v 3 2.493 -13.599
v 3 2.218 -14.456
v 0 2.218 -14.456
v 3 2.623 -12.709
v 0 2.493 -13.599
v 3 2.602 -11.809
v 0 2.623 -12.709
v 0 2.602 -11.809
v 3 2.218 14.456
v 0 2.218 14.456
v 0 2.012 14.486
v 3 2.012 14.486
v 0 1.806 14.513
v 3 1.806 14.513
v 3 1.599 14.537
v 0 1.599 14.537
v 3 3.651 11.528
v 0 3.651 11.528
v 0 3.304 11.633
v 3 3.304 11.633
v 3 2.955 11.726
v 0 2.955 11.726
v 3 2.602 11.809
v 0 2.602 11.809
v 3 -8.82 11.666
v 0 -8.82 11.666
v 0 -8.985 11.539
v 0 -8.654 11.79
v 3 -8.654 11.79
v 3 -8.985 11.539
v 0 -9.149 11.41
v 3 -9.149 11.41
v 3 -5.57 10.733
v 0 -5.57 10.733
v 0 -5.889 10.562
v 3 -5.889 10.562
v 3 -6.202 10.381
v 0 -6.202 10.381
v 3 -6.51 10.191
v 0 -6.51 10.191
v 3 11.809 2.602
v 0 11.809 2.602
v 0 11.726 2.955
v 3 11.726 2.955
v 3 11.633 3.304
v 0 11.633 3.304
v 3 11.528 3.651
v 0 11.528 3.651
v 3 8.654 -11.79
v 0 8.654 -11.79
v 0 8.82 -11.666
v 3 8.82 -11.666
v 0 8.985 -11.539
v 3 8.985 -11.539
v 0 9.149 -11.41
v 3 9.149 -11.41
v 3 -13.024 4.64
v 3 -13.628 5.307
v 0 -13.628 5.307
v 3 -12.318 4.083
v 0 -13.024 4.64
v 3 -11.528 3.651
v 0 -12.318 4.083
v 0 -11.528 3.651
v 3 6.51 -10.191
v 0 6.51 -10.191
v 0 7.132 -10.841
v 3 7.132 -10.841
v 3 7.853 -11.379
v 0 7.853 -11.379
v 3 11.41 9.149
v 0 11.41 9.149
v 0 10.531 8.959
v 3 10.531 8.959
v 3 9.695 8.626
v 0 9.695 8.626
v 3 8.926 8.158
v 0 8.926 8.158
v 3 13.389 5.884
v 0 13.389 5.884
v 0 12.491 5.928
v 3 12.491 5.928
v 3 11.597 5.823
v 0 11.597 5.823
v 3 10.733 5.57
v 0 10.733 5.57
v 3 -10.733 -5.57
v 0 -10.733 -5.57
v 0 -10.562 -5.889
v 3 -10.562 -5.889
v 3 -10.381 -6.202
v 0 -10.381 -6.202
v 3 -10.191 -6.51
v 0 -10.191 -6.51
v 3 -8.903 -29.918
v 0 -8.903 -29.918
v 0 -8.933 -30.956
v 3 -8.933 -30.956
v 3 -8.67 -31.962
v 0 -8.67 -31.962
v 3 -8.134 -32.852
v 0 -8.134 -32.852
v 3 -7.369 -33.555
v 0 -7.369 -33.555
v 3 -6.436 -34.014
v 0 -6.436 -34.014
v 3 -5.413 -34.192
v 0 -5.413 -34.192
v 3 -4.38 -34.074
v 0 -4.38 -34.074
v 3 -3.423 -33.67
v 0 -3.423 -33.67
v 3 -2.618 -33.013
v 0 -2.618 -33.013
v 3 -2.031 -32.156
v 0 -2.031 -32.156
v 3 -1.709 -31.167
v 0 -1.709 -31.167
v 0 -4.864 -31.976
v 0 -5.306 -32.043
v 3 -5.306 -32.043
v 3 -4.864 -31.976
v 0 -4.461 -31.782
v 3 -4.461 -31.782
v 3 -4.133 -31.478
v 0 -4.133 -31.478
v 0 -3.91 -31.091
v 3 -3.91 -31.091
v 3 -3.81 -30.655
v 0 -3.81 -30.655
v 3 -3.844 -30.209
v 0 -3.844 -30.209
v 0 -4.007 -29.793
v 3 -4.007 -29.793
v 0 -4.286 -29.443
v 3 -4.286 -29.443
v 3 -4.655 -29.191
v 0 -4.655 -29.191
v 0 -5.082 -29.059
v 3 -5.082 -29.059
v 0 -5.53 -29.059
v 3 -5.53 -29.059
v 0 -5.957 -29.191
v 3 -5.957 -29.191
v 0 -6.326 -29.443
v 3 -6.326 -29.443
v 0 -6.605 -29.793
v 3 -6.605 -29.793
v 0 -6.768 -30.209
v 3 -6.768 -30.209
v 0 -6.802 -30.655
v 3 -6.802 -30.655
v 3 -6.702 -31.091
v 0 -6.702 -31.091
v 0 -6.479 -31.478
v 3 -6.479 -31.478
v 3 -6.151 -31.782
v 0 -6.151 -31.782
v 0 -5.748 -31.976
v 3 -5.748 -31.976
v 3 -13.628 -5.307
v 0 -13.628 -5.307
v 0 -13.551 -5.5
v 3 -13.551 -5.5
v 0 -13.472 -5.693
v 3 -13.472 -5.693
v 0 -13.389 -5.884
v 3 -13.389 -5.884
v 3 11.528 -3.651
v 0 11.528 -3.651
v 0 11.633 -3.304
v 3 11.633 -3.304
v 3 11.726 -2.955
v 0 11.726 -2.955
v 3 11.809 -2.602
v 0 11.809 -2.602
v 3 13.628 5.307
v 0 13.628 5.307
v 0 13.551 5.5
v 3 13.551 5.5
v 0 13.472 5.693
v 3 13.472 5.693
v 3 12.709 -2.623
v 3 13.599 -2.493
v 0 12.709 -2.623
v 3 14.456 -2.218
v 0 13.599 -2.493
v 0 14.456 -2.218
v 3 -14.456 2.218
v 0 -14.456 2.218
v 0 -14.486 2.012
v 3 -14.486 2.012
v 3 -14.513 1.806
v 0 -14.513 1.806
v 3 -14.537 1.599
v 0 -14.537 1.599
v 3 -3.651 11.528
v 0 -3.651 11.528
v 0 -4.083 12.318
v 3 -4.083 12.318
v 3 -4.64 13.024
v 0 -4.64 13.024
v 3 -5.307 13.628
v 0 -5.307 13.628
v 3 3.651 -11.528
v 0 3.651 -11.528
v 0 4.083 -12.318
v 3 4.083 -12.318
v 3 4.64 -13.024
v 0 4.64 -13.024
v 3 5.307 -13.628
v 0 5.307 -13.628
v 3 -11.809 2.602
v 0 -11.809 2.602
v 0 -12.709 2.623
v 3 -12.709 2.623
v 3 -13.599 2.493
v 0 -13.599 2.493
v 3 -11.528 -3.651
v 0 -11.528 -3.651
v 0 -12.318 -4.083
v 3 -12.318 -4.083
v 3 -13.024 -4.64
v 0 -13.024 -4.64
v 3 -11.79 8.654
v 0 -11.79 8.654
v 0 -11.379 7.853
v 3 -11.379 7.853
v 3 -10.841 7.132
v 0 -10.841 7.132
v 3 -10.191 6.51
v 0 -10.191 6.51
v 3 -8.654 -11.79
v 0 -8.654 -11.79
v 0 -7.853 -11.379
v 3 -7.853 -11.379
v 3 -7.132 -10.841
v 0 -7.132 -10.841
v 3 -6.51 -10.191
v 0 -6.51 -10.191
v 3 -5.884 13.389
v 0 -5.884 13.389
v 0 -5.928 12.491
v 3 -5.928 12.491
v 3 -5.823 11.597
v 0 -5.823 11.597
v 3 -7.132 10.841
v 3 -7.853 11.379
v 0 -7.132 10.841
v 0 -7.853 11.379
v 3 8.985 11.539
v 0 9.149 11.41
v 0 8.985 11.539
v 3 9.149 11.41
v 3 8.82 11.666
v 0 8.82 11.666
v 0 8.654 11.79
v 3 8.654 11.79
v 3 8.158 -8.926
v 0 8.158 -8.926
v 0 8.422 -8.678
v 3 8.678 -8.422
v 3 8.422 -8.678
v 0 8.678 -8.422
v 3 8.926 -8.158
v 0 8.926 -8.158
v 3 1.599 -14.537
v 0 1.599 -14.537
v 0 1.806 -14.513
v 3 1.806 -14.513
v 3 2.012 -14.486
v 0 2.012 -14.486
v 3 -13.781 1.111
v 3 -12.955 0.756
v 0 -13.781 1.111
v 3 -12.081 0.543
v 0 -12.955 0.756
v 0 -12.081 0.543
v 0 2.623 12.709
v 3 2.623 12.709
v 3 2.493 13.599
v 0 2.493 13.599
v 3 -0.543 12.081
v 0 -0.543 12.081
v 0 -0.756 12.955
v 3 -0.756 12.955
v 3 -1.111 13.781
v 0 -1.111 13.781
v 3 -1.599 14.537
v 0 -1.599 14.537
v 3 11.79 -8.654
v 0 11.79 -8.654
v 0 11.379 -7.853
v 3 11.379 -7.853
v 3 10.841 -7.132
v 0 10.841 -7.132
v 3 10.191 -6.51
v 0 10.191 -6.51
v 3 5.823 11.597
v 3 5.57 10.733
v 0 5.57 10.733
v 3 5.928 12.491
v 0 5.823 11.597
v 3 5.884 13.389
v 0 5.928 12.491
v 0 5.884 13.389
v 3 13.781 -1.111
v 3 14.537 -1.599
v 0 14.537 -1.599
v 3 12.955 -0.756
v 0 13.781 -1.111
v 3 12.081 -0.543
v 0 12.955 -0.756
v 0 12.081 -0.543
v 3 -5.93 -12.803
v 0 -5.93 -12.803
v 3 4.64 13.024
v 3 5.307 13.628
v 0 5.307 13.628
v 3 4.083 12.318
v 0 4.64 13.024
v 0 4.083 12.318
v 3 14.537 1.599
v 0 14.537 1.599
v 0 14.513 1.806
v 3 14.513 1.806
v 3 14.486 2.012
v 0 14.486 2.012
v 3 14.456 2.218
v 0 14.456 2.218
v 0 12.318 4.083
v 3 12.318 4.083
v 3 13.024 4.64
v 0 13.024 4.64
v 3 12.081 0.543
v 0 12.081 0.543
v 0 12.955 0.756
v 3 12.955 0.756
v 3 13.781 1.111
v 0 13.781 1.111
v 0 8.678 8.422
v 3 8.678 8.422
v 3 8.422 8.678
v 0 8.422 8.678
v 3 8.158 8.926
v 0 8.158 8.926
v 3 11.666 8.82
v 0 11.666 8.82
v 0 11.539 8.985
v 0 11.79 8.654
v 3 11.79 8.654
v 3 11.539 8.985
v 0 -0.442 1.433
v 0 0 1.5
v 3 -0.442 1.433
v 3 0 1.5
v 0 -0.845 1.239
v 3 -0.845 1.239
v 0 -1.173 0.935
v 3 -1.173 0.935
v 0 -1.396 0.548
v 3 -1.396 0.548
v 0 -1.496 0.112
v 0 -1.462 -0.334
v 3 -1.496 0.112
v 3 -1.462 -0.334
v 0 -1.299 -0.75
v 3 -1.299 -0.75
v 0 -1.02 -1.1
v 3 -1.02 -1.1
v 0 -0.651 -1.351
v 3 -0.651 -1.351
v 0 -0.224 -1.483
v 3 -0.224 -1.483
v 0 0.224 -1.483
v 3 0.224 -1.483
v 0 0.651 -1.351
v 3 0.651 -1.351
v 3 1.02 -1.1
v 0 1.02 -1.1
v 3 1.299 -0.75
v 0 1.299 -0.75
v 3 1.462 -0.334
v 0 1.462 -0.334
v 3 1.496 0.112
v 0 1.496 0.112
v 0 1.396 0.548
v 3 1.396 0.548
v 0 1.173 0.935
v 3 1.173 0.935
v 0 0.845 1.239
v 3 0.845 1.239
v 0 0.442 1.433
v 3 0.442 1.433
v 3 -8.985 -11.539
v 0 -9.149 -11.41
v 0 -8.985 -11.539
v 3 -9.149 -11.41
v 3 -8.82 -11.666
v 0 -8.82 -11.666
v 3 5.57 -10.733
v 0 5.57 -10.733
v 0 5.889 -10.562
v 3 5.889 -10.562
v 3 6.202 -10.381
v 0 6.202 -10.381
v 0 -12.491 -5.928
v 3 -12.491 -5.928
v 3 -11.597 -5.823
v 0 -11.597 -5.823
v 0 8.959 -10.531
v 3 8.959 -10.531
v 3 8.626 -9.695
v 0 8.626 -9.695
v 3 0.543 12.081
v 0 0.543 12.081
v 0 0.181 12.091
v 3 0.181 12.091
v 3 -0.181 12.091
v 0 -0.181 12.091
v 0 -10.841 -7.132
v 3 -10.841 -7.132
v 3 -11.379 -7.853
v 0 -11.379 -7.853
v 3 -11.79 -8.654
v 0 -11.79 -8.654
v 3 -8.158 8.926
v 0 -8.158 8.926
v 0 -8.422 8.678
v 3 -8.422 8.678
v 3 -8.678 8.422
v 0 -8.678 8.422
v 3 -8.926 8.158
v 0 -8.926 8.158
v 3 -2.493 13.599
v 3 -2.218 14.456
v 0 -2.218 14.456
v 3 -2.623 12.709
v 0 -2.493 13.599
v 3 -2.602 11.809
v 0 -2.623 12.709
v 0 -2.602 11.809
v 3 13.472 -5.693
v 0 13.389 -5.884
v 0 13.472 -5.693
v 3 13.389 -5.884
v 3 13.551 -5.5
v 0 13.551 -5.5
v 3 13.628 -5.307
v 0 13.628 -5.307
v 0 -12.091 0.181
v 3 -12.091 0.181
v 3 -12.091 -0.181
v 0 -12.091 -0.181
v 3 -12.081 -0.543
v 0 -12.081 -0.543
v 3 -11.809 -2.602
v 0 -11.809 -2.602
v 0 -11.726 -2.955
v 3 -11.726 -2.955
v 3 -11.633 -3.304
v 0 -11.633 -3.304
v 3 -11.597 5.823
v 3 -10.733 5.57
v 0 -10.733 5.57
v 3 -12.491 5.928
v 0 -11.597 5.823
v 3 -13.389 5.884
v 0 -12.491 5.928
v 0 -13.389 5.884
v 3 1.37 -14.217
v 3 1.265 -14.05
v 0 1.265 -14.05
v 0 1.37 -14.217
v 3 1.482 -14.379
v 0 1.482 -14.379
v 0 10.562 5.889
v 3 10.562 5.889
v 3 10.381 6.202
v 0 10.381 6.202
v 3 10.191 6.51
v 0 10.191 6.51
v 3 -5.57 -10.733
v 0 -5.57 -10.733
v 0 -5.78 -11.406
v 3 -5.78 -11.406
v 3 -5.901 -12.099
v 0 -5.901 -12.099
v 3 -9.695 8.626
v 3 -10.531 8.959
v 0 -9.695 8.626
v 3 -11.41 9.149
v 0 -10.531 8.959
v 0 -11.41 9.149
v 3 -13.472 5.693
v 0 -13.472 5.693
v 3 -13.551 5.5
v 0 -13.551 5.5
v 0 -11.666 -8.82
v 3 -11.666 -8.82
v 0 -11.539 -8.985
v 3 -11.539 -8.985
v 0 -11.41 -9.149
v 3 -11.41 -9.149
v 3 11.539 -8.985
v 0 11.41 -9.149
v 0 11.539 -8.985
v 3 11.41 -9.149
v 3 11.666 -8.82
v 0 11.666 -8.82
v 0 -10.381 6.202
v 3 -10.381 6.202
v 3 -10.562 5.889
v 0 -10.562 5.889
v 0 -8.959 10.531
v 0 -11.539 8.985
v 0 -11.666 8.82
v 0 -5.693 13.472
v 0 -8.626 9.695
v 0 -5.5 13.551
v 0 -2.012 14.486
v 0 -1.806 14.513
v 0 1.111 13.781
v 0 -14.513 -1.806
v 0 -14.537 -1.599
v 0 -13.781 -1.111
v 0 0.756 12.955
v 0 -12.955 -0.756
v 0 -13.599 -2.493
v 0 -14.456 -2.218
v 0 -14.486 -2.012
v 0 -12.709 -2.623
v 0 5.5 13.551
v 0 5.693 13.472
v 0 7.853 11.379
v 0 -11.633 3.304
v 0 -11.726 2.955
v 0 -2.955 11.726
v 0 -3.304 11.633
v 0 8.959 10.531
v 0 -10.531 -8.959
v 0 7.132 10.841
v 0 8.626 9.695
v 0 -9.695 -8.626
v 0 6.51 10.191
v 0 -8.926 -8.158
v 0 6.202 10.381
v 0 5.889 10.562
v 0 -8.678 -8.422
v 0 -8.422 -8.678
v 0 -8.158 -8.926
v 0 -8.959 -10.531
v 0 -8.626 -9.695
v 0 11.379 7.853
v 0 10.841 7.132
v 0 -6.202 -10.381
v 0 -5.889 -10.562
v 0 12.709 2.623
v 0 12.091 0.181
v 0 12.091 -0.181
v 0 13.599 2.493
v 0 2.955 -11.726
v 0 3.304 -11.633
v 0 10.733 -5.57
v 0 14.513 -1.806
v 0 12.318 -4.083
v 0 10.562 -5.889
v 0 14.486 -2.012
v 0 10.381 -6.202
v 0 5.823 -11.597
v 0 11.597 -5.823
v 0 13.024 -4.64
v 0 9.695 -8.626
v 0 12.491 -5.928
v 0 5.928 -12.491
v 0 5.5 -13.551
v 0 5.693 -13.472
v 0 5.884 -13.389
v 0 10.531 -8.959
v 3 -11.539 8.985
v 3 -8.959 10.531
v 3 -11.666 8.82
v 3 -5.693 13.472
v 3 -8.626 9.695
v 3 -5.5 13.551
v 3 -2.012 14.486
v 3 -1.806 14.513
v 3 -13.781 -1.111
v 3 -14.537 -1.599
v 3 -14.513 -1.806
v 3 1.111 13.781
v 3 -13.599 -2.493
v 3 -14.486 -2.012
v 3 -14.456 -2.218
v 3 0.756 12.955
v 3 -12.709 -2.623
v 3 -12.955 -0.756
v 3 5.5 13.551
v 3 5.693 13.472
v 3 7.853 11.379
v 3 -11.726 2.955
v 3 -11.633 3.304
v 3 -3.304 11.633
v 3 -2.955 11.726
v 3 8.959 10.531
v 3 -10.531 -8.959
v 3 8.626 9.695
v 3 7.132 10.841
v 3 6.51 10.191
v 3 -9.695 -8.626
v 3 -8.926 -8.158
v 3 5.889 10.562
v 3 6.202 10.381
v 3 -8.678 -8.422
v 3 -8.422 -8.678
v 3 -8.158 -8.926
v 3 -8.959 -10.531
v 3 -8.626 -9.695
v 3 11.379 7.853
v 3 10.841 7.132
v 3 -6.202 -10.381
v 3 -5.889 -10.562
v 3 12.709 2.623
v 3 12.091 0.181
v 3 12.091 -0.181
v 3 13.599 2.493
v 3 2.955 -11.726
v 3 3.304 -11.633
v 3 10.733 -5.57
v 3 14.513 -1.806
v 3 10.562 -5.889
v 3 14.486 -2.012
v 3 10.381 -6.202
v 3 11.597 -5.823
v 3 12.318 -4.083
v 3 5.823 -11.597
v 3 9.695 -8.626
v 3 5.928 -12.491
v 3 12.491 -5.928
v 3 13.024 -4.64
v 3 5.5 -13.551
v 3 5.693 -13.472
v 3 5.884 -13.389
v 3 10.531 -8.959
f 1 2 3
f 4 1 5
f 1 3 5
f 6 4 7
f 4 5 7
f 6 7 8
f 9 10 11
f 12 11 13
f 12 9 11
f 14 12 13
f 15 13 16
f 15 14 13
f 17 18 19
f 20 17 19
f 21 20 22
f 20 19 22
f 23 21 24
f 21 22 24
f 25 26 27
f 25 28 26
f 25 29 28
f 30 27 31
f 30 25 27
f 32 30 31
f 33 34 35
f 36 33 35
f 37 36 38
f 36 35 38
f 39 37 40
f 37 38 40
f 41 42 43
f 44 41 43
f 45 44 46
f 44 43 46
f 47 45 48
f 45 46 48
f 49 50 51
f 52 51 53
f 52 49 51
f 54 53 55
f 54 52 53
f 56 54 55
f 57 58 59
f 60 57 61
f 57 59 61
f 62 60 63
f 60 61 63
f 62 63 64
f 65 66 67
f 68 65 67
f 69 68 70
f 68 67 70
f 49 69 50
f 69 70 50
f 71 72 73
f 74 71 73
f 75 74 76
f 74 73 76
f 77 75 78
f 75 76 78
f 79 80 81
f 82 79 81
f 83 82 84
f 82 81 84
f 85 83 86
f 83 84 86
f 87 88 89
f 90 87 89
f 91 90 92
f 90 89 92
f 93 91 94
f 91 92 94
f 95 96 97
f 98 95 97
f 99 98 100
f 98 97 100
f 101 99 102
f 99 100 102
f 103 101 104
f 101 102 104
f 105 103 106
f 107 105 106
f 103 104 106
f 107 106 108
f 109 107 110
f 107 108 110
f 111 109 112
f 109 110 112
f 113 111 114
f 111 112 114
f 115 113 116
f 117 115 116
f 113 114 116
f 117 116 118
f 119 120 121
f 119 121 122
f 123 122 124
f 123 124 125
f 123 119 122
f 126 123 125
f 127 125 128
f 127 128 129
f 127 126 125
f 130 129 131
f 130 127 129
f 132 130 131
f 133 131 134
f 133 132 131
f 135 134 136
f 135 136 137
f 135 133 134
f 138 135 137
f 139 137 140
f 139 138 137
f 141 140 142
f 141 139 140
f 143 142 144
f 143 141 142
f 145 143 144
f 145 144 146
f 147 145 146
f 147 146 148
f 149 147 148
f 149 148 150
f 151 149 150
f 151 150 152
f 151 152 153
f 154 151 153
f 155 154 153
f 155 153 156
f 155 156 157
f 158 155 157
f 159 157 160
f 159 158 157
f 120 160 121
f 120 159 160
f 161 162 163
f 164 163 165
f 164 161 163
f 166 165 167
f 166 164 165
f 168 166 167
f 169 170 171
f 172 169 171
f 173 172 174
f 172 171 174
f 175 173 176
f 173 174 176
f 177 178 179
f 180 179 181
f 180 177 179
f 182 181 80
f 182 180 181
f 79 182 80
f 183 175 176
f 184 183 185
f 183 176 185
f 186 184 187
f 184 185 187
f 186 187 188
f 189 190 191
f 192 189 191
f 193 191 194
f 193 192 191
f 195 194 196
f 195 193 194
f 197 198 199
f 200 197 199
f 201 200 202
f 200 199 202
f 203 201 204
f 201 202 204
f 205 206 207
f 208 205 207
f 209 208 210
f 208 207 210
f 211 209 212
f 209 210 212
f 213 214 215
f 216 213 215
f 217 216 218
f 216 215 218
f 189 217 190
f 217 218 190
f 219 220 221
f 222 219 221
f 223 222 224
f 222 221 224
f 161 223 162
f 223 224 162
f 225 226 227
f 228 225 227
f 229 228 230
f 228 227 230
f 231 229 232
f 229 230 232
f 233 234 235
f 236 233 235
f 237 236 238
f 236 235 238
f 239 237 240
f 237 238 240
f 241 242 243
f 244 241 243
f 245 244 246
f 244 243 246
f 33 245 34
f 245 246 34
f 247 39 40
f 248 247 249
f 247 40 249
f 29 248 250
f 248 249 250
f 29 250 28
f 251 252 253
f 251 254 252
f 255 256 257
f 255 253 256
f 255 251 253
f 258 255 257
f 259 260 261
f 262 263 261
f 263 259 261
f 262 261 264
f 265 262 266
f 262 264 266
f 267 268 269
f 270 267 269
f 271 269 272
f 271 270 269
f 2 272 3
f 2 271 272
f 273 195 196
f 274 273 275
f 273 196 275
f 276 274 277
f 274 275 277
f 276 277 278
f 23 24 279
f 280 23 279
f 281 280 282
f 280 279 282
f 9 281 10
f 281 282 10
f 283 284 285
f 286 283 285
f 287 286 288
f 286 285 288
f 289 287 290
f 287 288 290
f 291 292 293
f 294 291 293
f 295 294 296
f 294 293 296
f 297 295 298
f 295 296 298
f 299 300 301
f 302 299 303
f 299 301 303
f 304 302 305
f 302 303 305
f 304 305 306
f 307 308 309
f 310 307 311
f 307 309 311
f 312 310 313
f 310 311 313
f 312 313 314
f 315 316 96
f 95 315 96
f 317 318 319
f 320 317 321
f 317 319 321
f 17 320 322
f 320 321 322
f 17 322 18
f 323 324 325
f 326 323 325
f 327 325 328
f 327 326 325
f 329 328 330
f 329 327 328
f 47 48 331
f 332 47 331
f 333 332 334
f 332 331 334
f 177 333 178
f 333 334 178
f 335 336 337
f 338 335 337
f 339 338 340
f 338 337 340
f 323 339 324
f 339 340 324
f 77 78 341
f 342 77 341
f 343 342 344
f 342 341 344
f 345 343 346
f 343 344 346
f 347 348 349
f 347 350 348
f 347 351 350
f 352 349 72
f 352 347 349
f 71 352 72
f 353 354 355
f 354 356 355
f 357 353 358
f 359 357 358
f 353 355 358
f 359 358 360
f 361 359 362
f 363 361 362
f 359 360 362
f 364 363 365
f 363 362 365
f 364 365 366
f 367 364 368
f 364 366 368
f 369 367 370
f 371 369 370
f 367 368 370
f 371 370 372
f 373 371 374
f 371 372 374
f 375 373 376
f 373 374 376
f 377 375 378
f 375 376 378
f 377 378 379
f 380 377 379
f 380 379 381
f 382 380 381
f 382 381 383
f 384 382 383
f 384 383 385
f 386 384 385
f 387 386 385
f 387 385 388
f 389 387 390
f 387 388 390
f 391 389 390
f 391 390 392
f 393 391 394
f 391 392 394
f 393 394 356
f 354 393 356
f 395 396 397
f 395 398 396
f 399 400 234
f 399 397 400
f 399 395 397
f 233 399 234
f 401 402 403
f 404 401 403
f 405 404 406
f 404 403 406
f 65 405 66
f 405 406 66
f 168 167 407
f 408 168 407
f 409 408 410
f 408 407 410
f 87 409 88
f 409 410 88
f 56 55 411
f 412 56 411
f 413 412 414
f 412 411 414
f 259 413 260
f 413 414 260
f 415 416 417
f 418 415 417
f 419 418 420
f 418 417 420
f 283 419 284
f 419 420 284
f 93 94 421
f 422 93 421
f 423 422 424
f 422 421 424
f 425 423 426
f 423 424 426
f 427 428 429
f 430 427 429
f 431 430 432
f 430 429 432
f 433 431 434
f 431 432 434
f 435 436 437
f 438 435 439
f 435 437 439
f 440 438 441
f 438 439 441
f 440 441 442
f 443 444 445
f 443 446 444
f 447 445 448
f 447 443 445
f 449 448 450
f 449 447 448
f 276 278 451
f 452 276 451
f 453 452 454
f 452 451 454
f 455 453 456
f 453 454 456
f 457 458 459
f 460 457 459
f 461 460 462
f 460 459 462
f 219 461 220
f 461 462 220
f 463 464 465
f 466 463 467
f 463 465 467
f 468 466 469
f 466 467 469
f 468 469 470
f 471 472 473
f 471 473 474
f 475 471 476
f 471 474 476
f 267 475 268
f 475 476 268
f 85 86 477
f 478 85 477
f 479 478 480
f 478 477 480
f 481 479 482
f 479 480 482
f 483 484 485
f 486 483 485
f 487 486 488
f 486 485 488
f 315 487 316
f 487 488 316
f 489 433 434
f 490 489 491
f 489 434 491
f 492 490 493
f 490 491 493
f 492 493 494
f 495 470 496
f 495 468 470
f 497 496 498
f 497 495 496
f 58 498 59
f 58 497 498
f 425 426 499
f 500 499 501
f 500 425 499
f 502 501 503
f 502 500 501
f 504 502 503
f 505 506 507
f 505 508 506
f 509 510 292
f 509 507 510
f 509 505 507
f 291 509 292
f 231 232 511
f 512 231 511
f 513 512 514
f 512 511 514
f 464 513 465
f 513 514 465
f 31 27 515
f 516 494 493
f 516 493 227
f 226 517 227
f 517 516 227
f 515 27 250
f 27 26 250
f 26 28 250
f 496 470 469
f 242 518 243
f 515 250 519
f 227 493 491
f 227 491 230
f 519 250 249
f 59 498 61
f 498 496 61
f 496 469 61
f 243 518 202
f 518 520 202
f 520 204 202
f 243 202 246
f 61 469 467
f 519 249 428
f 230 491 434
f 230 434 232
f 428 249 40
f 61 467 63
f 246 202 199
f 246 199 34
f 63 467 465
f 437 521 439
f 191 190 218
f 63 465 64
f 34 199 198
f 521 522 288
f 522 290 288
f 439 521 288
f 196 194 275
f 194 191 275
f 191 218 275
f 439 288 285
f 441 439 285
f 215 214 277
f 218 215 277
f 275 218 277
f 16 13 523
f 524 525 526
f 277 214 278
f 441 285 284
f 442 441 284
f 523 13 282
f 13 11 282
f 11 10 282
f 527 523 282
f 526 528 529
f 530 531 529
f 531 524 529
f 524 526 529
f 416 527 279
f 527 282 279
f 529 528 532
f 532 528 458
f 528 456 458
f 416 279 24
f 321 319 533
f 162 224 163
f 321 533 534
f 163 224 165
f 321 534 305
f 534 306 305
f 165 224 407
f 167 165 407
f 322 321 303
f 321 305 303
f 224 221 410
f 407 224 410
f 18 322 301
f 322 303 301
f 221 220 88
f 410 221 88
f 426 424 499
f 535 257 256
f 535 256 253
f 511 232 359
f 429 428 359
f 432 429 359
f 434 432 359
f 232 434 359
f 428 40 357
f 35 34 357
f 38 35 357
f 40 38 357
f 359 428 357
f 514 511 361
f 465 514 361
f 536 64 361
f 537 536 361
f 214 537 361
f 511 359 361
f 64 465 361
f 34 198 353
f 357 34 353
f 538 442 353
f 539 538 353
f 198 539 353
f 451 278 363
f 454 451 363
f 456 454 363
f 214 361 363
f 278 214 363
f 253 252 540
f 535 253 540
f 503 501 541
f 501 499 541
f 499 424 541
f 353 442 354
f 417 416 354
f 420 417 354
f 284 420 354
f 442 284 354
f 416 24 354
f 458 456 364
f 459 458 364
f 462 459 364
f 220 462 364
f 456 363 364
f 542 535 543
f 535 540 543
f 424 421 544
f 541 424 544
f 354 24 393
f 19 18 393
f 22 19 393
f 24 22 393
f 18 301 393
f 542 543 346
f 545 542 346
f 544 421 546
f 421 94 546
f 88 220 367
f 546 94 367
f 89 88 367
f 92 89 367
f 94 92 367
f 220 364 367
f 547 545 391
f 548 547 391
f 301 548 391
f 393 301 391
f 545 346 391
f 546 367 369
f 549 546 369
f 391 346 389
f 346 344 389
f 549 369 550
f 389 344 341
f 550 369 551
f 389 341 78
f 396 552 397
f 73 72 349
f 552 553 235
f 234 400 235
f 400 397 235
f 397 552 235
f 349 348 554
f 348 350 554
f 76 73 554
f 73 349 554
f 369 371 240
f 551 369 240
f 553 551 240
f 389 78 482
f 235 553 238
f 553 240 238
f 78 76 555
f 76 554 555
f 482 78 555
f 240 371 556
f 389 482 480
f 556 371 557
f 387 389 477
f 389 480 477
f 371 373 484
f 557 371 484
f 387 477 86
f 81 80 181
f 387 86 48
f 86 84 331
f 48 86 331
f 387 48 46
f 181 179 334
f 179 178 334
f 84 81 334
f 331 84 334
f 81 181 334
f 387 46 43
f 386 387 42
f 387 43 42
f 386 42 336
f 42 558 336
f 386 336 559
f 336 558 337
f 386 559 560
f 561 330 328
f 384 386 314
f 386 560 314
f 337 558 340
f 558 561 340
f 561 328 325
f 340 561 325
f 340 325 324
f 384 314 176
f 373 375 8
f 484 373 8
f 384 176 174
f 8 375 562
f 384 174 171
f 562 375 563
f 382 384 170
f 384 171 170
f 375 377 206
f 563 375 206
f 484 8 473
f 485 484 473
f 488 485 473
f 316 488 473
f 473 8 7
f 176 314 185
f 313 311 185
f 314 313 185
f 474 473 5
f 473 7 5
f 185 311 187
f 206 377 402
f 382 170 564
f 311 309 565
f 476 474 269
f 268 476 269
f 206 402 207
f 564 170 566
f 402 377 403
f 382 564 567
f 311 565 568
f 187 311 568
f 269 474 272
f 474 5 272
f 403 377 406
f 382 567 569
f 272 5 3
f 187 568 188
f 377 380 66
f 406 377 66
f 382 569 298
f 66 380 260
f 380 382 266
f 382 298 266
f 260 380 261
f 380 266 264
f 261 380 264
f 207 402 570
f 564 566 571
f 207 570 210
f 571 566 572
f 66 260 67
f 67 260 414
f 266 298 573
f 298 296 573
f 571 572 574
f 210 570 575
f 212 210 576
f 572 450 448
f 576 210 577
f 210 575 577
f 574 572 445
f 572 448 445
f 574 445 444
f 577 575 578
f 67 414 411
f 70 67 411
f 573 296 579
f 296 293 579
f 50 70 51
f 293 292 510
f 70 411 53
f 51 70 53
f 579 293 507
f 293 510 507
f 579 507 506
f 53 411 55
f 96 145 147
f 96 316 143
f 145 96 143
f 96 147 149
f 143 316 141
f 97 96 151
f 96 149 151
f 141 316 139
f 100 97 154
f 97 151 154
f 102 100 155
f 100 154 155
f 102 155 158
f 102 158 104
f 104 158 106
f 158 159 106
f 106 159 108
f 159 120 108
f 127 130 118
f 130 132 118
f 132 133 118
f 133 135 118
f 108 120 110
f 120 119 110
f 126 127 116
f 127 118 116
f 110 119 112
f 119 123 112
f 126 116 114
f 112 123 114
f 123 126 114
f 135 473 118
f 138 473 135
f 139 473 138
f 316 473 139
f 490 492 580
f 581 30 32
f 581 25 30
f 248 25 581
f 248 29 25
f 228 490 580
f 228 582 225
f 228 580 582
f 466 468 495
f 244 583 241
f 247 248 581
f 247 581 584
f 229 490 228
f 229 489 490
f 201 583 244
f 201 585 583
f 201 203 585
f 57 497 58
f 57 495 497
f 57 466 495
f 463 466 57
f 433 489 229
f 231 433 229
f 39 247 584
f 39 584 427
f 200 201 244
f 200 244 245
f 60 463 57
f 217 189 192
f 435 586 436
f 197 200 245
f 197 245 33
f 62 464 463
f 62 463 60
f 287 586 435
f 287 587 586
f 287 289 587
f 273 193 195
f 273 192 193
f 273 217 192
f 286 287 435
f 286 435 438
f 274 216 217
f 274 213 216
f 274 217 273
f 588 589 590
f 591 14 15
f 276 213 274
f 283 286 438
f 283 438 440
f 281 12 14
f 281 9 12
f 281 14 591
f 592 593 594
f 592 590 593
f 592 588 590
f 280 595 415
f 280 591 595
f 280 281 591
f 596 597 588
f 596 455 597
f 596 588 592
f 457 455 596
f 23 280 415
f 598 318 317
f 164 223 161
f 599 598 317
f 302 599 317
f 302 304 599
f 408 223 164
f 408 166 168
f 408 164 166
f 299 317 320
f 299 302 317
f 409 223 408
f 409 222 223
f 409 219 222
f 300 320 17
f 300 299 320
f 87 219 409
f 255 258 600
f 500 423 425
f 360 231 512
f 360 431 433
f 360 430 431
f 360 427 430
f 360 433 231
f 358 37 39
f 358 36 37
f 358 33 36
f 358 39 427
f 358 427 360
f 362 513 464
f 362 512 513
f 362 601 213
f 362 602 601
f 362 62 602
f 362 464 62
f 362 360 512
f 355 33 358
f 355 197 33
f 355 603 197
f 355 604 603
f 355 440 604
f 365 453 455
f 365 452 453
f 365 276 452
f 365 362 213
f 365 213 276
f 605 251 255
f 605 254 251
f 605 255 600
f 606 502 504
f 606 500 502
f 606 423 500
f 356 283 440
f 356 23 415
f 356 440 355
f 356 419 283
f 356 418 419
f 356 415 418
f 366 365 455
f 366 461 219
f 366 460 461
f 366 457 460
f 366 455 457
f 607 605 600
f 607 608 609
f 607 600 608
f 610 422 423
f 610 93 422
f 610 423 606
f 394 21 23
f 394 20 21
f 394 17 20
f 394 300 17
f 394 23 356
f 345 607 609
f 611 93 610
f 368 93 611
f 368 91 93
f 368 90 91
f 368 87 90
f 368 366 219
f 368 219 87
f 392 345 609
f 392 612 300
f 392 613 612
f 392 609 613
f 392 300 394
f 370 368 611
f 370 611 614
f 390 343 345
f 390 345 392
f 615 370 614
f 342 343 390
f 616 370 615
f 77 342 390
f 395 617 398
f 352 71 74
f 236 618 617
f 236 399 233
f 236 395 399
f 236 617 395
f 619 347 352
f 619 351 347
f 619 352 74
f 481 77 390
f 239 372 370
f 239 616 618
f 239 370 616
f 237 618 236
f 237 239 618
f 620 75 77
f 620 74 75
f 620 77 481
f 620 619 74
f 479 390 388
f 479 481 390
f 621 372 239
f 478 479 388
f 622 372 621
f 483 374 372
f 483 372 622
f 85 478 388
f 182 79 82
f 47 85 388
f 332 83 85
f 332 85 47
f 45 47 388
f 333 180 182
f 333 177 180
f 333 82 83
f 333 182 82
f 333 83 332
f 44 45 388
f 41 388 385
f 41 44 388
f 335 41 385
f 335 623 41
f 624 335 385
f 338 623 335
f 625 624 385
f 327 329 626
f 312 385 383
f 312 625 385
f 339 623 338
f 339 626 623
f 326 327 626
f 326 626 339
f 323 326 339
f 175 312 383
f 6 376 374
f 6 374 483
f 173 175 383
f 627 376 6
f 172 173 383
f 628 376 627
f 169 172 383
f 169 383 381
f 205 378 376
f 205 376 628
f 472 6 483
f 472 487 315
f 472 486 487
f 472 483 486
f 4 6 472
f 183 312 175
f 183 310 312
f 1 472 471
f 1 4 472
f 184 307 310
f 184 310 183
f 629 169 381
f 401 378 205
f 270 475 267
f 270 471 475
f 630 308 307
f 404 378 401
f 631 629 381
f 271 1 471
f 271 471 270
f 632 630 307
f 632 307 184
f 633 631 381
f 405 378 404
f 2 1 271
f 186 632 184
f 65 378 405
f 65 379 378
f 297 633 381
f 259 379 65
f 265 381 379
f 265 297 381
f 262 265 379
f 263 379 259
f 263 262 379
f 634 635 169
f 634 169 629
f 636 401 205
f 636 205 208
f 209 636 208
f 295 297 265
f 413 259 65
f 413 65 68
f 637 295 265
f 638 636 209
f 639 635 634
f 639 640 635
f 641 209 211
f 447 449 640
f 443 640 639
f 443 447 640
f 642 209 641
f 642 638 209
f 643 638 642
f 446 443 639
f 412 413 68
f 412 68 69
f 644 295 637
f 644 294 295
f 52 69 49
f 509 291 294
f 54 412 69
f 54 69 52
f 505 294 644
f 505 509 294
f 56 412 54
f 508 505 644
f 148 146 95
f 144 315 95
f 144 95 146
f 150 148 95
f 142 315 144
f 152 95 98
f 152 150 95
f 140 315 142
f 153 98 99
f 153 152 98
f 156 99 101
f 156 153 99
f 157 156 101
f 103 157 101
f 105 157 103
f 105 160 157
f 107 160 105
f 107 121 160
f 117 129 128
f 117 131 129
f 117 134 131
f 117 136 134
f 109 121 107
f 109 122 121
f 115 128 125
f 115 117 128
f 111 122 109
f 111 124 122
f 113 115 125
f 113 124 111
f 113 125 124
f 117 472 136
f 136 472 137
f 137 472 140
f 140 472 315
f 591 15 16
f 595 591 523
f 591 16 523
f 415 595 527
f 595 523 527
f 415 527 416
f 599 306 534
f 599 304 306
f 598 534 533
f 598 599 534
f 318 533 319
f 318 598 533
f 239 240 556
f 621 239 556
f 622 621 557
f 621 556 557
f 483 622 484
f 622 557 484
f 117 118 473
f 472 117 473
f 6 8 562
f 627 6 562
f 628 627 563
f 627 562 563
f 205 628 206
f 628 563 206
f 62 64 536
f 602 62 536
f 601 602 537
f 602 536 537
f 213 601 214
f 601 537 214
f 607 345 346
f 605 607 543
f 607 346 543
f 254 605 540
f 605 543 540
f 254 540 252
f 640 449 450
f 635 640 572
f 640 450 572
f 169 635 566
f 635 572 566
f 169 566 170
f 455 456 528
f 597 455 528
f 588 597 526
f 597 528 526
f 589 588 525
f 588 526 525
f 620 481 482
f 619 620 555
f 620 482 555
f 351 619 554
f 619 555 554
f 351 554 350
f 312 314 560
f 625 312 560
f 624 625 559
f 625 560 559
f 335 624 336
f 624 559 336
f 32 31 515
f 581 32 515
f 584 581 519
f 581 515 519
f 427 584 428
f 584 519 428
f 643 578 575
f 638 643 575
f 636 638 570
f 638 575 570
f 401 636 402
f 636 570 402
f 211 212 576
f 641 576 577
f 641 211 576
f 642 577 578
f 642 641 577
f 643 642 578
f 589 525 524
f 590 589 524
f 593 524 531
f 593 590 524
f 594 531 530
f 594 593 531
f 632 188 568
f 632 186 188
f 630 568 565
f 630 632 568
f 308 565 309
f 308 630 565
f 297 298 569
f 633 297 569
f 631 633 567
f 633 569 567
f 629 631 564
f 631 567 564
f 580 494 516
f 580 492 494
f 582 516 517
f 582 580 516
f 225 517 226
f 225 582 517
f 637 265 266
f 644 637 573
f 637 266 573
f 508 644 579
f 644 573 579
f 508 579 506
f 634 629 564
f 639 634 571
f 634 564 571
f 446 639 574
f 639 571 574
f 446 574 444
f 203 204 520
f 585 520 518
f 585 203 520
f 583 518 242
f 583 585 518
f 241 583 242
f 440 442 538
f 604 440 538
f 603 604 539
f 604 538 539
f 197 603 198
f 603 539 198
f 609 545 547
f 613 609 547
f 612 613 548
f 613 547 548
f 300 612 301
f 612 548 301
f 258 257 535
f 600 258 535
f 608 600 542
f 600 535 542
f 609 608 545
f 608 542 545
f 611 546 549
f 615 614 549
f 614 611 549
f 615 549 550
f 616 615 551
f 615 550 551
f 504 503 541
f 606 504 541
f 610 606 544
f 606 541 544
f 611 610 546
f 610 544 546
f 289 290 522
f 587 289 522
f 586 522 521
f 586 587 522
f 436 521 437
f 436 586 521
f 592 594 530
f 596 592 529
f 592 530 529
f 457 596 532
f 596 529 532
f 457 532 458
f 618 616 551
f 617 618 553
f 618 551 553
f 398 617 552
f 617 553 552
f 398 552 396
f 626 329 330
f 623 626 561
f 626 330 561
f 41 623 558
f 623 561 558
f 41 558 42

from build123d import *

# Parameters (mm, degrees)
BASPROSKE_W         = 3
BASPROSKE_H         = 14.625
TOOTHCUT_DEPTH      = 21.89931219
TEETHCUTS_COUNT     = 24
TEETHCUTS_ANGLE     = 345
BORSKE_R            = 1.5
BORE_DEPTH          = 50.0000508
SKETCH1_R           = 1.5
BOSS_EXTRUDE1_DEPTH = 3


with BuildPart() as part:
    # BasProSke → Base-Revolve (revolve)
    with BuildSketch(Plane(origin=(0, 0, 0), x_dir=(1, 0, 0), z_dir=(0, 1, 0)), mode=Mode.PRIVATE) as base_revolve_sk:
        with Locations((1.5, 7.3125)):
            Rectangle(BASPROSKE_W, BASPROSKE_H)
    revolve(base_revolve_sk.sketch.rotate(Axis((-10, 0, 0), (1, 0, 0)), 180), axis=Axis((-10, 0, 0), (1, 0, 0)))

    # TooCutSke → ToothCut (cut, through all)
    with BuildSketch(Plane(origin=(0, 0, 0), x_dir=(0, 0, -1), z_dir=(1, 0, 0))):
        with BuildLine():
            ThreePointArc((0.542722358, 12.080565177), (0, 12.09275), (-0.542722358, 12.080565177))
            ThreePointArc((-0.542722358, 12.080565177), (-0.922320579, 13.38903626), (-1.617327261, 14.56085412))
            ThreePointArc((-1.617327261, 14.56085412), (0, 14.6504), (1.617327261, 14.56085412))
            ThreePointArc((1.617327261, 14.56085412), (0.922320579, 13.38903626), (0.542722358, 12.080565177))
        make_face()
    toothcut = extrude(amount=TOOTHCUT_DEPTH, mode=Mode.SUBTRACT)

    # TeethCuts: ToothCut ×24 about axis
    teethcuts_axis = Axis((-10, 0, 0), (1, 0, 0))
    for i in range(1, TEETHCUTS_COUNT):
        add(toothcut.rotate(teethcuts_axis, i * TEETHCUTS_ANGLE / (TEETHCUTS_COUNT - 1)), mode=Mode.SUBTRACT)

    # BorSke → Bore (cut, symmetric)
    with BuildSketch(Plane(origin=(0, 0, 0), x_dir=(0, 0, -1), z_dir=(1, 0, 0))):
        with Locations(Location((0, 0, 0), (0, 0, 180))):
            Circle(BORSKE_R)
    extrude(amount=BORE_DEPTH, both=True, mode=Mode.SUBTRACT)

    # Sketch1 → Boss-Extrude1 (add)
    with BuildSketch(Plane(origin=(0, 0, 0), x_dir=(0, 0, -1), z_dir=(1, 0, 0))):
        with BuildLine():
            Line((31.167426359, -1.708998873), (11.983233878, 1.623794441))
            Line((11.983233878, 1.623794441), (10.733437515, -5.57027124))
            Line((10.733437515, -5.57027124), (29.917629996, -8.903064553))
            ThreePointArc((29.917629996, -8.903064553), (34.139561018, -5.930929895), (31.167426359, -1.708998873))
        make_face()
        with Locations((30.542528177, -5.306031713)):
            Circle(SKETCH1_R, mode=Mode.SUBTRACT)
    extrude(amount=BOSS_EXTRUDE1_DEPTH)


solid = part.part
